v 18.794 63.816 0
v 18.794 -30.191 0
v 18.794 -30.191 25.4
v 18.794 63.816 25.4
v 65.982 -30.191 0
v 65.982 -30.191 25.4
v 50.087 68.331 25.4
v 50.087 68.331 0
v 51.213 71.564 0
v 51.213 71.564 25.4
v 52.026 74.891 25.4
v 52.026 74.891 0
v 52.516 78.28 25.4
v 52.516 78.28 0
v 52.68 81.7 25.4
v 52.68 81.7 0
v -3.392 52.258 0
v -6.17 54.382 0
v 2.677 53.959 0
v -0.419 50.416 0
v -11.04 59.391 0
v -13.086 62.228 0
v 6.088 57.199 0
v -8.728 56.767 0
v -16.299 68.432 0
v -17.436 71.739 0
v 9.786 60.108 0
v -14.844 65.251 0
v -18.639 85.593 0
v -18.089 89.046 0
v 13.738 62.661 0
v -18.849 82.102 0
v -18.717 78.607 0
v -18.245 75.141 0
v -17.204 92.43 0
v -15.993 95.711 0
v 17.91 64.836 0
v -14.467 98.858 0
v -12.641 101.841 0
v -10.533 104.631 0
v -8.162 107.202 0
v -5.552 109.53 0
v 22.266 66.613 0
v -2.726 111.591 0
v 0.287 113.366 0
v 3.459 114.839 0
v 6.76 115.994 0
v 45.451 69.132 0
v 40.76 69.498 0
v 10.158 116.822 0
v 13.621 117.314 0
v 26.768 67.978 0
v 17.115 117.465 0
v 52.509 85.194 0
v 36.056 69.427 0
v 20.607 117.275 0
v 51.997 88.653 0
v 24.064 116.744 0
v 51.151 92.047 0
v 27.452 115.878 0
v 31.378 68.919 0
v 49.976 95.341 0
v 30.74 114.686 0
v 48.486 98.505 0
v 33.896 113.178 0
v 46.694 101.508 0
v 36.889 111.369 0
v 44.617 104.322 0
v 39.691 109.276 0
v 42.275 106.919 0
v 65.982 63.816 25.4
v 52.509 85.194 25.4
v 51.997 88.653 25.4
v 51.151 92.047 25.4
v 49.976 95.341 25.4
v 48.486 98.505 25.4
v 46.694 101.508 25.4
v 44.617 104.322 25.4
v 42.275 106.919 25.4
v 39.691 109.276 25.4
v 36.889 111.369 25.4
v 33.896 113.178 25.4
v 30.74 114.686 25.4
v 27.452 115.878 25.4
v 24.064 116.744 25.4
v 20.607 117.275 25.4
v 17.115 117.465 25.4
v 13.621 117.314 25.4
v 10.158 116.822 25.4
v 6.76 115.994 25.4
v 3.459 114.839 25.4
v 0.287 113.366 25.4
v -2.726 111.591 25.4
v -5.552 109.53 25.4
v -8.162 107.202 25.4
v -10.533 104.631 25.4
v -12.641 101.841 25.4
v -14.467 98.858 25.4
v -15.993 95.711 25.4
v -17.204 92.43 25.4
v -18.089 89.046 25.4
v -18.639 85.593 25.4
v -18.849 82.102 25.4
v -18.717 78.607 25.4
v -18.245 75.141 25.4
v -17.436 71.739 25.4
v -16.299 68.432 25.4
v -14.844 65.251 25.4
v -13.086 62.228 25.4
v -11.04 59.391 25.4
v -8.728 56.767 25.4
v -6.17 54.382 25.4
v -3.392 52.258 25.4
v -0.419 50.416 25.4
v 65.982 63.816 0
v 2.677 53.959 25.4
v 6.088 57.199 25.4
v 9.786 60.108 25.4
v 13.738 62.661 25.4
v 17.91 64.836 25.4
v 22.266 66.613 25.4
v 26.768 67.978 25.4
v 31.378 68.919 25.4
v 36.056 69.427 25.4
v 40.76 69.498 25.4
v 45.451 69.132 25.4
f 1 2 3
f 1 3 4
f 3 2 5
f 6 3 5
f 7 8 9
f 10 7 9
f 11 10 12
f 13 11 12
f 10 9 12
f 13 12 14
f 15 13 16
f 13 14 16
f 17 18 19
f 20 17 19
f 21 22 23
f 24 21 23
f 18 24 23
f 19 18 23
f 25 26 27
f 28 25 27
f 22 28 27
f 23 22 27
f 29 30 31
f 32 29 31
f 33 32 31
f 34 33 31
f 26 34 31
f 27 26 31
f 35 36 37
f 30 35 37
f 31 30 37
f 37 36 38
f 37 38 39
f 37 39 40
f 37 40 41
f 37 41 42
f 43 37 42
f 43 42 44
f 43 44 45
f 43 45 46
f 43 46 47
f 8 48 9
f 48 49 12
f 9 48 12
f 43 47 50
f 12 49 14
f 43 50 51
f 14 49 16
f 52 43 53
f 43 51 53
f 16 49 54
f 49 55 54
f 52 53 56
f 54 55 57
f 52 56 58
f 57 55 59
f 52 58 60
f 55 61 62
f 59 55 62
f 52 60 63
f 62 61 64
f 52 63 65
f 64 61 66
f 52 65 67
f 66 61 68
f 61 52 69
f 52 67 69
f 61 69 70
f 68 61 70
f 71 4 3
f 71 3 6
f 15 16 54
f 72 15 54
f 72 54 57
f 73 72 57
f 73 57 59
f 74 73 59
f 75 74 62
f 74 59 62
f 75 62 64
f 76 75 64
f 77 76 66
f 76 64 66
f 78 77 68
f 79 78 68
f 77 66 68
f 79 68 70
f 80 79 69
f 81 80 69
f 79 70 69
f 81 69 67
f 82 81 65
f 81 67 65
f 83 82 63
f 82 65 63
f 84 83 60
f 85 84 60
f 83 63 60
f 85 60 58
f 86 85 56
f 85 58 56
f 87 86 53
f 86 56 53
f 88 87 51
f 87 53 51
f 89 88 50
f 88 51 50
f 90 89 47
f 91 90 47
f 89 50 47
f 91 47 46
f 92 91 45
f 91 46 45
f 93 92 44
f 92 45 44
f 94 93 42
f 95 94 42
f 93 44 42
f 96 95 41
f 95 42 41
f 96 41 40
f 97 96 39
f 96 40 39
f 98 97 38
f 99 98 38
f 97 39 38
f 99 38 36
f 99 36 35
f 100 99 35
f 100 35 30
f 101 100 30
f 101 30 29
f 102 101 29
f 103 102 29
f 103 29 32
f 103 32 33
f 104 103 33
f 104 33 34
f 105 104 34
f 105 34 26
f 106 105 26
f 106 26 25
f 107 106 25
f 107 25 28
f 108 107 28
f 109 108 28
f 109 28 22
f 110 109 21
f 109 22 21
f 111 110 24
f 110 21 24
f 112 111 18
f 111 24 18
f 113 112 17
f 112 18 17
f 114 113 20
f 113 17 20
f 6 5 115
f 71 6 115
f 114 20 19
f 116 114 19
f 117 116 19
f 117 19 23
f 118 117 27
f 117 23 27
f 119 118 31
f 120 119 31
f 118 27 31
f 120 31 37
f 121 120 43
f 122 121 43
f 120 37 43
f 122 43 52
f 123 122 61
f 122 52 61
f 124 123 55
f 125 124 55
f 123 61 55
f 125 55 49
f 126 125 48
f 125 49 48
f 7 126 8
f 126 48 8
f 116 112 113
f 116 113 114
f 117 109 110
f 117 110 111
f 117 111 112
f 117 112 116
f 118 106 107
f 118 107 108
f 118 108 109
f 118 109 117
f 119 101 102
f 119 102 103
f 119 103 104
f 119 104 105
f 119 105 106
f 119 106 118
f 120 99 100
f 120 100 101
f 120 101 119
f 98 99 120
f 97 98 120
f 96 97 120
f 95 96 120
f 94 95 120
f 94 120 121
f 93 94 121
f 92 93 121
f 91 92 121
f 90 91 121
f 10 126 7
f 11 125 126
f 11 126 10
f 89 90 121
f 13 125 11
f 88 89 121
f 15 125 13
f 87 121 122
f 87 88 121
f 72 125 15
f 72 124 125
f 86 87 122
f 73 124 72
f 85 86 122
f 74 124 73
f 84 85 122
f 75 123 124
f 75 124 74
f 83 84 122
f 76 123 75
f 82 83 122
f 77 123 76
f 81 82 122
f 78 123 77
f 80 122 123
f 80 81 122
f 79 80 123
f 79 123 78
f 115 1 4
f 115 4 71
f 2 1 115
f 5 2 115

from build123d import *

# Parameters (mm, degrees)
F0_W     = 47.187932
F0_H     = 94.006688
F1_DEPTH = 25.4
F3_DEPTH = 25.4


with BuildPart() as f1:
    # F0 (on Top) → F1 (new body)
    with BuildSketch(Plane.XY):
        with Locations((42.387802, 16.81228)):
            Rectangle(F0_W, F0_H)
    extrude(amount=F1_DEPTH)


with BuildPart() as f3:
    # F2 (on Top) → F3 (new body)
    with BuildSketch(Plane.XY):
        with BuildLine():
            ThreePointArc((-0.418847, 50.415695), (22.265938, 66.613218), (50.086956, 68.33081))
            ThreePointArc((50.086956, 68.33081), (52.025609, 74.891057), (52.679804, 81.700407))
            ThreePointArc((52.679804, 81.700407), (-1.241174, 112.515176), (-0.418847, 50.415695))
        make_face()
    extrude(amount=F3_DEPTH)


solid = Compound([f1.part, f3.part])
